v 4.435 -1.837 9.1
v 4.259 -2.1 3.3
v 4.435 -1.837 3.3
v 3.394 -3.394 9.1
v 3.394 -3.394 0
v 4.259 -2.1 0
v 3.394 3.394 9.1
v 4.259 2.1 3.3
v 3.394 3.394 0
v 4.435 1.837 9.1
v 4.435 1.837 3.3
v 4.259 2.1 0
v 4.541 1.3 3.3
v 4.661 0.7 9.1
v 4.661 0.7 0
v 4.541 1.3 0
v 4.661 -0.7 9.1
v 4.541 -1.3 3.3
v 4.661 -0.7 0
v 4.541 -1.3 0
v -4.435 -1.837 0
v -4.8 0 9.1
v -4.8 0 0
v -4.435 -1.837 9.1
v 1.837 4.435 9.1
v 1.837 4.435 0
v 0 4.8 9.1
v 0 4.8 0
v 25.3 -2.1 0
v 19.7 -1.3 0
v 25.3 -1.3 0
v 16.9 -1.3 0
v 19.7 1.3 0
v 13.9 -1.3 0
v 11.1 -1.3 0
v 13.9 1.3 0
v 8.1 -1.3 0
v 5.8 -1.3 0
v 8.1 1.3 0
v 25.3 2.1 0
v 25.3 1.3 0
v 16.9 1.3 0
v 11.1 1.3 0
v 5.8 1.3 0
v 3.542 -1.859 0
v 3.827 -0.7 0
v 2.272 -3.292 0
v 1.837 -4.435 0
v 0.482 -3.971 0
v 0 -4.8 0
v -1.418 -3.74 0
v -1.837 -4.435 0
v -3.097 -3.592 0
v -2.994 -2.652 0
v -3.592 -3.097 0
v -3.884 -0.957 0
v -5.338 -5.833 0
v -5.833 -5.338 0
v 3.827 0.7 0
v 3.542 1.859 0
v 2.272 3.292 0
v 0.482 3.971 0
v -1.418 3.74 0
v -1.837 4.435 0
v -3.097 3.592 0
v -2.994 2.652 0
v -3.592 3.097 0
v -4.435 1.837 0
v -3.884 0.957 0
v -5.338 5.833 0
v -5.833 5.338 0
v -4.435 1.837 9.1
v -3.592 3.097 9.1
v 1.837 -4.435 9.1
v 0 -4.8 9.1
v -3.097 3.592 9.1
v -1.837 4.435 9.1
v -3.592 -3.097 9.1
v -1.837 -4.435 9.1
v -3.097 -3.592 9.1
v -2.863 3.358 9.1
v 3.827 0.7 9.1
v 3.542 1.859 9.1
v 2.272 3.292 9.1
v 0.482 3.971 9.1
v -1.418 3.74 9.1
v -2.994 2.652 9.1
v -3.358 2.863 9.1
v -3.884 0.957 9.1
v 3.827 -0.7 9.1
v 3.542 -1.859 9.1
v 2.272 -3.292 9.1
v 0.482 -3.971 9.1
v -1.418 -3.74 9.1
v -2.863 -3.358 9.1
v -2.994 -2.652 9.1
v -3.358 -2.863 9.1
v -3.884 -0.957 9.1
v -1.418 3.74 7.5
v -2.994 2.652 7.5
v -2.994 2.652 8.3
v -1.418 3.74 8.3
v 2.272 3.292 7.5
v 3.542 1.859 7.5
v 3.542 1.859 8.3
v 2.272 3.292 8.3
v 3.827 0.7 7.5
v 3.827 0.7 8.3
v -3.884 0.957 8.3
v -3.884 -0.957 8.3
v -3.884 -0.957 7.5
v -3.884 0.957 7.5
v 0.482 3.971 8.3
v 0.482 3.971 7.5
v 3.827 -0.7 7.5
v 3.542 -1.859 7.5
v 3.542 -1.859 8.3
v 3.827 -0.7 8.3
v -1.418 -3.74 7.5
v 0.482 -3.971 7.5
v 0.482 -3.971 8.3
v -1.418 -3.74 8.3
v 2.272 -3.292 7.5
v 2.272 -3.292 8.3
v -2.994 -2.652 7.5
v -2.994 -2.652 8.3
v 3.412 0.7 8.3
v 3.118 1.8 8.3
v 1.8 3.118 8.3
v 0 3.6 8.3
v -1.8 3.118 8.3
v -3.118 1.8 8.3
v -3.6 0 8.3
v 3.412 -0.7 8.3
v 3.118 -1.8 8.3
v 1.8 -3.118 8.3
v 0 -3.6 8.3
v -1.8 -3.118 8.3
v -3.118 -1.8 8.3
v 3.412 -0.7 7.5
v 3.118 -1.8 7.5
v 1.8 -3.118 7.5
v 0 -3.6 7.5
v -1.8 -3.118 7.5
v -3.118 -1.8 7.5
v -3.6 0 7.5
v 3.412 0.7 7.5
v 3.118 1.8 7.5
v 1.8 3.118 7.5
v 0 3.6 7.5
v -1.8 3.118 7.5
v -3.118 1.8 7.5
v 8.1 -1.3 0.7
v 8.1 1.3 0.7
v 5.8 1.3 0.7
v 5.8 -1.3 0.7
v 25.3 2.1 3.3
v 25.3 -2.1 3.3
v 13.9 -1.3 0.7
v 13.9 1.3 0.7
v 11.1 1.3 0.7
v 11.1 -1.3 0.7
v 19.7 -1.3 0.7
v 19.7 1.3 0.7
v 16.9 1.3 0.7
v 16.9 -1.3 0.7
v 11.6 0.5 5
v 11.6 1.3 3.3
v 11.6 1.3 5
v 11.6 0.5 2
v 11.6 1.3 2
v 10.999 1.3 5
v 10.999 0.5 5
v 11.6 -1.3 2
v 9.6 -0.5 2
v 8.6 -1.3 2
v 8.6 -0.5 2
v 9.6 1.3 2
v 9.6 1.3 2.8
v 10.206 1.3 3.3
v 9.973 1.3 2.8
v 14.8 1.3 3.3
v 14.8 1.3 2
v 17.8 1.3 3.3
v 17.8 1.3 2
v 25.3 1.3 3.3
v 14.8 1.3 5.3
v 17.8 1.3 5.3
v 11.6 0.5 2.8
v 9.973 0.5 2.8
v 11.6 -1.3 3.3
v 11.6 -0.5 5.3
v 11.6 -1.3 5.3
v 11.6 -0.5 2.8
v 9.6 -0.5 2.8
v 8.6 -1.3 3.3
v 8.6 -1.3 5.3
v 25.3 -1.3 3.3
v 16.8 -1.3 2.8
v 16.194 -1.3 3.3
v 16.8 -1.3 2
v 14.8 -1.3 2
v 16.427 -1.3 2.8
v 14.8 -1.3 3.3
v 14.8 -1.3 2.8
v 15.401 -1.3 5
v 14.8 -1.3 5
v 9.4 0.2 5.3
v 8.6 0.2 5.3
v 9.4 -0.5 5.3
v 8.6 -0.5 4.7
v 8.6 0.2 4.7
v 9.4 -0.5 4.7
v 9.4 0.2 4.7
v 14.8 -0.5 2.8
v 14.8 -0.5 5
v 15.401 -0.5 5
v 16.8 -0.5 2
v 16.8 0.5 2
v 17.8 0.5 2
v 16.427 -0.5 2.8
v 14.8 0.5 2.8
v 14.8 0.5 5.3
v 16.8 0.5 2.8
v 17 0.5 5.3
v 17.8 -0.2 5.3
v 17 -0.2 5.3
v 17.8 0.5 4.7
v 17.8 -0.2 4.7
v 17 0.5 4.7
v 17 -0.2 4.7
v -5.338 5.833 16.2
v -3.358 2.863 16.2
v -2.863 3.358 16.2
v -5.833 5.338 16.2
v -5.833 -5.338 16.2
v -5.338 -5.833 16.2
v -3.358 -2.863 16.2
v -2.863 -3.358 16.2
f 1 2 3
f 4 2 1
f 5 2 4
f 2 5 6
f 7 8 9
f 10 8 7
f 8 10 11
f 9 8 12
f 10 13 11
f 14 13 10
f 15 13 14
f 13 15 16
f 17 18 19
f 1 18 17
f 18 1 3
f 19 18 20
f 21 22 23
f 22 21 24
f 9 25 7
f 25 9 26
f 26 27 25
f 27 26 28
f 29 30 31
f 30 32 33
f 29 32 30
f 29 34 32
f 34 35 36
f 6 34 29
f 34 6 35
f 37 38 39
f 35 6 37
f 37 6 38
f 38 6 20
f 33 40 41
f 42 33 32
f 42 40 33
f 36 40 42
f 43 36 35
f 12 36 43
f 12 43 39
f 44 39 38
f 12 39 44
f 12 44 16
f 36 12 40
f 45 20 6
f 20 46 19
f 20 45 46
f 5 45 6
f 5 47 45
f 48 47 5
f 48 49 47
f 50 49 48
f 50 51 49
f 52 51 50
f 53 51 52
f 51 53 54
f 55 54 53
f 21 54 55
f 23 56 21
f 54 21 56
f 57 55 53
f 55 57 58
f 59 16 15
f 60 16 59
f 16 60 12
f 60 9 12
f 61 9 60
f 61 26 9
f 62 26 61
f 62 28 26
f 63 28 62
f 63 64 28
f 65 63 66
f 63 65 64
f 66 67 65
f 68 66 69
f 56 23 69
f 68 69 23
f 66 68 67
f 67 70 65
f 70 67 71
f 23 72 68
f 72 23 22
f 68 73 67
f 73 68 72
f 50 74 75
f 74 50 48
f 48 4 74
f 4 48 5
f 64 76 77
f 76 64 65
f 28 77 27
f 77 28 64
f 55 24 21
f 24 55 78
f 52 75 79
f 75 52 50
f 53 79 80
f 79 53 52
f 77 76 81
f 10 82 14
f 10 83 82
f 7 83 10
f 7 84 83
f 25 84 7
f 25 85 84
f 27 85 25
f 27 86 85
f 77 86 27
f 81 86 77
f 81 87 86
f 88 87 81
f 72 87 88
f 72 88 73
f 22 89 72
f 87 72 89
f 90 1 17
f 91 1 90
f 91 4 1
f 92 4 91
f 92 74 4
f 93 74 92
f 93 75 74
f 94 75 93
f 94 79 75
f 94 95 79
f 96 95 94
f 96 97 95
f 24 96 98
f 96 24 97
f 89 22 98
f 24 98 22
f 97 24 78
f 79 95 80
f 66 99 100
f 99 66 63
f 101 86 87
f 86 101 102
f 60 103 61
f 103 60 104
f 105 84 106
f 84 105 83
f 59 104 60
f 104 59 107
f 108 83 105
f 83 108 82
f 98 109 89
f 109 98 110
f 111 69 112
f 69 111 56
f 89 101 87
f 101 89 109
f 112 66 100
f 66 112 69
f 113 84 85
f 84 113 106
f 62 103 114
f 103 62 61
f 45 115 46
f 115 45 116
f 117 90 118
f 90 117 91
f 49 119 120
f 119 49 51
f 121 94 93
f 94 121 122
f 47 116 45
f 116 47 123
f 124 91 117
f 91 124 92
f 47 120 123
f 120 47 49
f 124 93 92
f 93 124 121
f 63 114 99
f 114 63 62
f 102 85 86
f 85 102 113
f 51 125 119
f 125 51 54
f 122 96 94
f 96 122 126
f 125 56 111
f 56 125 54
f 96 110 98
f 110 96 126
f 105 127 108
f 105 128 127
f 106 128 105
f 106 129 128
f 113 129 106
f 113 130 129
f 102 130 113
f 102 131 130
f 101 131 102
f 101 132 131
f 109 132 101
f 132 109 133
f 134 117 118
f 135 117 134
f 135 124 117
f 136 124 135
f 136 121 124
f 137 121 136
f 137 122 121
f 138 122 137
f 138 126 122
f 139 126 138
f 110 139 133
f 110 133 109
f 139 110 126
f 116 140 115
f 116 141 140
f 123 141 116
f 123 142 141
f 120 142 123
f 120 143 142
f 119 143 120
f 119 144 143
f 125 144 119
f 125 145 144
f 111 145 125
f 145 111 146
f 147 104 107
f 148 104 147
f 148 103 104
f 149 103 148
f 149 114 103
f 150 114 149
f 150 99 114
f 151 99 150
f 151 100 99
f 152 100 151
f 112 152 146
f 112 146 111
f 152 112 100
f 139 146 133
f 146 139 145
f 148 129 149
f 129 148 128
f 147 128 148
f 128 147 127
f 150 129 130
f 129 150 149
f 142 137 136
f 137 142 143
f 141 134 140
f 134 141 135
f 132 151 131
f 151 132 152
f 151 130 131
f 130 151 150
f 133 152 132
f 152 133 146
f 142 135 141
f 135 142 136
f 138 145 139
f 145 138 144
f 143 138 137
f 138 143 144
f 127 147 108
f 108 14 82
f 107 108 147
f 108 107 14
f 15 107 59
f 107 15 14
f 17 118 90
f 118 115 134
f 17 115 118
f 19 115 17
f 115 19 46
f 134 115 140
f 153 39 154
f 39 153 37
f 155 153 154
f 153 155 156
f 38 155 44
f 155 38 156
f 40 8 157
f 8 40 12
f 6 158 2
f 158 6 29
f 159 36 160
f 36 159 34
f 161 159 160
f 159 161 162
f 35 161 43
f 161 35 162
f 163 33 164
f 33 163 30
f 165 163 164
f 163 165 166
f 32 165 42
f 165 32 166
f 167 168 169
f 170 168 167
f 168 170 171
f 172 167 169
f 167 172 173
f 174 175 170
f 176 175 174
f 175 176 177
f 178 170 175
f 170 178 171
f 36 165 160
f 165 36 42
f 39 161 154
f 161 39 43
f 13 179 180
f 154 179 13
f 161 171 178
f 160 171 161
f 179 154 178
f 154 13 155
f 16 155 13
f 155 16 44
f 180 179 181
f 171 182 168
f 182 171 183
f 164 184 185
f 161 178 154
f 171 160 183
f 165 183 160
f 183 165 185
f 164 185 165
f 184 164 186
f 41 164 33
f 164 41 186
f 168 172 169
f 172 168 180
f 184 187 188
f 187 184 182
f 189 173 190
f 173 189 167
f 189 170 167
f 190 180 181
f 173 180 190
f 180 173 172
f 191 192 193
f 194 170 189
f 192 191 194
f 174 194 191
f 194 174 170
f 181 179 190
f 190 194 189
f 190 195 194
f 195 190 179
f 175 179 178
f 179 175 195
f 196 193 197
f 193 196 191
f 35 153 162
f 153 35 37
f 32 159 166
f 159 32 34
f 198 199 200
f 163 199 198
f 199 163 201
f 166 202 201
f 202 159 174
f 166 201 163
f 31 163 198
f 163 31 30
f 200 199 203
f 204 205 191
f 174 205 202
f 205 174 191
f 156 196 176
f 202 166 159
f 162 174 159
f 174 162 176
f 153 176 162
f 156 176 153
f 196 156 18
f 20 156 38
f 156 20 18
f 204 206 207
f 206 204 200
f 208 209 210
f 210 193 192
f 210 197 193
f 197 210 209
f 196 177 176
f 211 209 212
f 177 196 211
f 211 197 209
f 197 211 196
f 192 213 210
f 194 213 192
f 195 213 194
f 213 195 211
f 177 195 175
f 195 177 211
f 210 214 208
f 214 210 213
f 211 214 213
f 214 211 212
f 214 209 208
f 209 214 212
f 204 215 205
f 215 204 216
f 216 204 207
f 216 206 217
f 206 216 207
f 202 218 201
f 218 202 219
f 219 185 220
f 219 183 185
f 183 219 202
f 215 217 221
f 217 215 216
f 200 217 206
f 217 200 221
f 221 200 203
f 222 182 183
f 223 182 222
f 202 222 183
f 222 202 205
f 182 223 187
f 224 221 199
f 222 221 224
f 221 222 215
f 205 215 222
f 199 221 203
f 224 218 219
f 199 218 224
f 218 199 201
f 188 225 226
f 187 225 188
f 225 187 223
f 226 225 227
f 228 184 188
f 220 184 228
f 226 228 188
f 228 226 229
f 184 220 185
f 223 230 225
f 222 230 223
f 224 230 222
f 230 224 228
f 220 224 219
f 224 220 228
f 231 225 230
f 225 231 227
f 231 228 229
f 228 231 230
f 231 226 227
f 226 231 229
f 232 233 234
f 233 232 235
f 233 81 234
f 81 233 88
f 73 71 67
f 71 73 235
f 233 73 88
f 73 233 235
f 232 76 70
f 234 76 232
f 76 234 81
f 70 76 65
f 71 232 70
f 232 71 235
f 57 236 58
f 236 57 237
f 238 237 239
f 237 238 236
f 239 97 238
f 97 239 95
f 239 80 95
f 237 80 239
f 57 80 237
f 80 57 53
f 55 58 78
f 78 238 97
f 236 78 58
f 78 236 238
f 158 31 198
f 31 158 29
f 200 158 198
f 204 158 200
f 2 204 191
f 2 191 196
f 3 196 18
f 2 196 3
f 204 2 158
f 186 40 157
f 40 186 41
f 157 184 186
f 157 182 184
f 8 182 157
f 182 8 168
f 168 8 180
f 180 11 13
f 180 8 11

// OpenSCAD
// Crazyflie 2.0 motor mount

// Copyright (C) 2015 Embecosm Limited (www.embecosm.com)

// Contributor: Jeremy Bennett <jeremy.bennett@embecosm.com>

// This file is licensed under the Creative Commons Attribution-ShareAlike 3.0
// Unported License. To view a copy of this license, visit
// http://creativecommons.org/licenses/by-sa/3.0/ or send a letter to Creative
// Commons, PO Box 1866, Mountain View, CA 94042, USA.

// 45678901234567890123456789012345678901234567890123456789012345678901234567890


// Stick the various parts together in the correct place.  Everything sits on
// or above the X-Y plane, with the motor mount cylinder centered on the
// origin.


// Constants defining the components
EPSILON        = 0.001;

MOTOR_CYL_R    = 4.0;
MOTOR_CYL_WALL = 0.8;
MOTOR_CYL_H    = 9.1;           // Real cylinder extends 0.8 below
MOTOR_SLOT_W   = 1.4;
MOTOR_RIDGE_H  = 0.8;
MOTOR_RIDGE_T  = 0.4;

LEG_H = 16.2;                   // Real leg extends 0.8 below
LEG_W =  3.5;
LEG_IN_T  = 0.9;                // Leg thickness tapers
LEG_OUT_T = 0.5;

ARM_WALL_H = 3.3;
ARM_WALL_W = 21.3;
ARM_WALL_T = 0.8;

ARM_BASE_XOFF = 1.0;
ARM_BASE_W    = 4.2;
ARM_BASE_T    = 0.7;
ARM_BASE_GAP  = 3.0;
ARM_BASE1_L   = 2.3;
ARM_BASE2_L   = 2.8;
ARM_BASE3_L   = 2.8;

HOOK_XOFF1   =  3.8;
HOOK_XOFF2   = 10.0;
HOOK_ZOFF    =  2.0;
HOOK_BASE_W  =  2.0;
HOOK_BASE_T  =  0.8;
HOOK_SIDE1_W =  3.0;
HOOK_SIDE1_H =  3.3;
HOOK_SIDE1_T =  0.8;
HOOK_SIDE2_W =  2.0;
HOOK_SIDE2_H =  3.0;
HOOK_SIDE2_T =  0.8;
HOOK_SIDE2_A = 25.0;
HOOK_TOP_W   =  0.8;
HOOK_TOP_H   =  1.5;
HOOK_TOP_T   =  0.6;

// The motor cylinder

module motor_cyl () {
   difference () {
      union () {
         // The main cylinder
         difference () {
            cylinder (r = MOTOR_CYL_R + MOTOR_CYL_WALL, h = MOTOR_CYL_H,
                      center = false);
            cylinder (r = MOTOR_CYL_R, h = MOTOR_CYL_H, center = false);
         }
         // The ridge
         translate (v = [0, 0, MOTOR_CYL_H - MOTOR_RIDGE_H * 2])
            difference () {
               cylinder (r = MOTOR_CYL_R + MOTOR_CYL_WALL, h = MOTOR_RIDGE_H,
                         center = false);
               cylinder (r = MOTOR_CYL_R - MOTOR_RIDGE_T, h = MOTOR_RIDGE_H,
                         center = false);
            }
      }
      // Slot
      translate (v = [0, -MOTOR_SLOT_W / 2, 0])
         cube (size = [MOTOR_CYL_R + MOTOR_CYL_R, MOTOR_SLOT_W, MOTOR_CYL_H],
               center = false);
   }
}


// The legs. For now we do as a cube

// @param  t  Distance to translate along X axis before rotating
// @param  a  Angle to rotate around Z axis

module legs (t, a) {
   leg_t = (LEG_IN_T + LEG_OUT_T) / 2;
   rotate (a = [0, 0, a])
      translate (v = [t - EPSILON, - leg_t / 2, 0])
         cube (size = [LEG_W, leg_t, LEG_H], center = false);
}


// The arm wall

// @param  xoff  Offset in X direction
// @param  yoff  Offset in Y direction

module arm_wall (xoff, yoff) {
   translate (v = [xoff, yoff, 0])
      cube (size = [ARM_WALL_W, ARM_WALL_T, ARM_WALL_H]);
}


// Bars across the base

// @param[in] xoff  Offset from X direction
module base_bars (xoff) {
   // First base bar
   translate (v = [xoff, -ARM_BASE_W / 2, 0])
      cube (size = [ARM_BASE1_L, ARM_BASE_W, ARM_BASE_T]);
   // Second base bar
   translate (v = [xoff + ARM_BASE1_L + ARM_BASE_GAP, -ARM_BASE_W / 2, 0])
      cube (size = [ARM_BASE2_L, ARM_BASE_W, ARM_BASE_T]);
   // Third base bar
   translate (v = [xoff + ARM_BASE1_L + ARM_BASE2_L + ARM_BASE_GAP * 2,
                   -ARM_BASE_W / 2, 0])
      cube (size = [ARM_BASE3_L, ARM_BASE_W, ARM_BASE_T]);
}


// Wire hooks across the top

// @param[in] xoff  Offset from X direction
module wire_hook (xoff) {
   // Base
   base_xoff  = HOOK_SIDE1_W - HOOK_BASE_W;
   side2_xoff = HOOK_SIDE1_W - HOOK_SIDE2_W;
   translate (v = [xoff + base_xoff, - ARM_BASE_W / 2 + ARM_WALL_T, HOOK_ZOFF])
      cube (size = [HOOK_BASE_W, ARM_BASE_W - ARM_WALL_T * 2, HOOK_BASE_T]);
   // Side 1
   translate (v = [xoff, - ARM_BASE_W / 2 + ARM_WALL_T, HOOK_ZOFF])
      cube (size = [HOOK_SIDE1_W, HOOK_SIDE1_T, HOOK_SIDE1_H]);
   // Side 2
   translate (v = [xoff + side2_xoff, ARM_BASE_W / 2 - ARM_WALL_T * 2,
                   HOOK_ZOFF])
      intersection () {
         cube (size = [HOOK_SIDE2_W, HOOK_SIDE2_T, HOOK_SIDE2_H]);
         rotate (a = [0, HOOK_SIDE2_A, 0])
            cube (size = [HOOK_SIDE2_W, HOOK_SIDE2_T, HOOK_SIDE2_H * 2]);
      }
   // Top
   translate (v = [xoff, - ARM_BASE_W / 2 + ARM_WALL_T,
              HOOK_ZOFF + HOOK_SIDE1_H - HOOK_TOP_T])
      cube (size = [HOOK_TOP_W, HOOK_TOP_H, HOOK_TOP_T]);
}


// Stick everything together.
module motor_mount () {
   motor_cyl ();
   legs (MOTOR_CYL_R + MOTOR_CYL_WALL / 2, 135.0);
   legs (MOTOR_CYL_R + MOTOR_CYL_WALL / 2, 225.0);
   arm_wall (xoff = MOTOR_CYL_R,
             yoff = - ARM_BASE_W / 2);
   arm_wall (xoff = MOTOR_CYL_R,
             yoff = ARM_BASE_W / 2 - ARM_WALL_T);
   base_bars (xoff = MOTOR_CYL_R + MOTOR_CYL_WALL + ARM_BASE_XOFF);
   wire_hook (xoff = MOTOR_CYL_R + MOTOR_CYL_WALL + HOOK_XOFF1);
   rotate (a = [0, 0, 180])
      wire_hook (xoff = -MOTOR_CYL_R - MOTOR_CYL_WALL - HOOK_XOFF2
                        - HOOK_SIDE1_W);
}


motor_mount ();
